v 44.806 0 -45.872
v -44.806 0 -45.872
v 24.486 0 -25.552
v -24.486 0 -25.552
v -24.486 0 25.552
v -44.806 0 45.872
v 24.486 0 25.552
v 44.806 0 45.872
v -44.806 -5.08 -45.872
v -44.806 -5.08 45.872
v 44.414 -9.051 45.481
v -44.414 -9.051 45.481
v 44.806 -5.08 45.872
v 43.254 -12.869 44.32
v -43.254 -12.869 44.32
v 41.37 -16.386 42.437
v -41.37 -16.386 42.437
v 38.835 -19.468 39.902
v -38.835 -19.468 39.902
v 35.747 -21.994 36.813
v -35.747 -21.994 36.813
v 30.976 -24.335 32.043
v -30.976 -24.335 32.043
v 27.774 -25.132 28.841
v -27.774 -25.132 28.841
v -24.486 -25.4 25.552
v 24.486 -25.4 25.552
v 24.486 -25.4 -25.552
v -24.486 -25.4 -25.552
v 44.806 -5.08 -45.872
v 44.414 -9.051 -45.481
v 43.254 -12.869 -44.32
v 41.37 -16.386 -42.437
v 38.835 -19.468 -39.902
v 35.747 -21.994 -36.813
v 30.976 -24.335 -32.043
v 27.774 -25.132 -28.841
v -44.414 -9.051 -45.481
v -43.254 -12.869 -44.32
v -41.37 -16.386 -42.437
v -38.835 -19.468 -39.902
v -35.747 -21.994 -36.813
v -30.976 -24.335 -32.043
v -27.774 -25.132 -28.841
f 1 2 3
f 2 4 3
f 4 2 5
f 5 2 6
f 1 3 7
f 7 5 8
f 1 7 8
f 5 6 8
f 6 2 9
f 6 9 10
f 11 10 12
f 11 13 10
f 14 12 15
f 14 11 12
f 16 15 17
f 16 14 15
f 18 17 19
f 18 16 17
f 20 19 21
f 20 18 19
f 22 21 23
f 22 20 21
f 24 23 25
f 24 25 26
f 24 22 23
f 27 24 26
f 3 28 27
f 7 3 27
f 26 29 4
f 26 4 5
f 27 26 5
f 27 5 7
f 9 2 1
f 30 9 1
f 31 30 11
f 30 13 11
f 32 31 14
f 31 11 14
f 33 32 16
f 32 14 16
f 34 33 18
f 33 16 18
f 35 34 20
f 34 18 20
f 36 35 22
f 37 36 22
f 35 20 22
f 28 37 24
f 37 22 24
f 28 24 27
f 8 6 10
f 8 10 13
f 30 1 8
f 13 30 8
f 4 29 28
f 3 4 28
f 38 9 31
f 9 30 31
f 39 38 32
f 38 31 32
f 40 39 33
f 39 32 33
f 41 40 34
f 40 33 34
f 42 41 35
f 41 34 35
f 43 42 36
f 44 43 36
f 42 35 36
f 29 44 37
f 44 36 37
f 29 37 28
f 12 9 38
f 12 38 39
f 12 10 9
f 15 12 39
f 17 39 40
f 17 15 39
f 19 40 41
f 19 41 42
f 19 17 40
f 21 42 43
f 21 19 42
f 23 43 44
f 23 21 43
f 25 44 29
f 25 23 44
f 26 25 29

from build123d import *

# Parameters (mm, degrees)
F0_W      = 89.611202
F0_H      = 91.744802
F1_DEPTH  = 25.4
F2_R      = 20.32
F3_W      = 49.377598
F3_H      = 50.9016
F1_FACE_W = 48.971202
F1_FACE_H = 51.104802
F4_DEPTH  = 127


with BuildPart() as f1:
    # F0 (on Front) → F1 (new body)
    with BuildSketch(Plane.XZ):
        Rectangle(F0_W, F0_H)
    extrude(amount=F1_DEPTH)

    # F2
    f2_edges = [f1.edges().sort_by_distance(p)[0] for p in [
        (44.805601, -25.4, 0),
        (0, -25.4, 45.872401),
        (-44.805601, -25.4, 0),
        (0, -25.4, -45.872401),
    ]]
    fillet(f2_edges, radius=F2_R)

    # F3 (on Front) + F1_face (on face) → F4 (cut)
    with BuildSketch(Plane.XZ):
        Rectangle(F3_W, F3_H)
    with BuildSketch(Plane.XZ.offset(25.4)):
        Rectangle(F1_FACE_W, F1_FACE_H)
    extrude(amount=-F4_DEPTH, mode=Mode.SUBTRACT)


solid = f1.part
